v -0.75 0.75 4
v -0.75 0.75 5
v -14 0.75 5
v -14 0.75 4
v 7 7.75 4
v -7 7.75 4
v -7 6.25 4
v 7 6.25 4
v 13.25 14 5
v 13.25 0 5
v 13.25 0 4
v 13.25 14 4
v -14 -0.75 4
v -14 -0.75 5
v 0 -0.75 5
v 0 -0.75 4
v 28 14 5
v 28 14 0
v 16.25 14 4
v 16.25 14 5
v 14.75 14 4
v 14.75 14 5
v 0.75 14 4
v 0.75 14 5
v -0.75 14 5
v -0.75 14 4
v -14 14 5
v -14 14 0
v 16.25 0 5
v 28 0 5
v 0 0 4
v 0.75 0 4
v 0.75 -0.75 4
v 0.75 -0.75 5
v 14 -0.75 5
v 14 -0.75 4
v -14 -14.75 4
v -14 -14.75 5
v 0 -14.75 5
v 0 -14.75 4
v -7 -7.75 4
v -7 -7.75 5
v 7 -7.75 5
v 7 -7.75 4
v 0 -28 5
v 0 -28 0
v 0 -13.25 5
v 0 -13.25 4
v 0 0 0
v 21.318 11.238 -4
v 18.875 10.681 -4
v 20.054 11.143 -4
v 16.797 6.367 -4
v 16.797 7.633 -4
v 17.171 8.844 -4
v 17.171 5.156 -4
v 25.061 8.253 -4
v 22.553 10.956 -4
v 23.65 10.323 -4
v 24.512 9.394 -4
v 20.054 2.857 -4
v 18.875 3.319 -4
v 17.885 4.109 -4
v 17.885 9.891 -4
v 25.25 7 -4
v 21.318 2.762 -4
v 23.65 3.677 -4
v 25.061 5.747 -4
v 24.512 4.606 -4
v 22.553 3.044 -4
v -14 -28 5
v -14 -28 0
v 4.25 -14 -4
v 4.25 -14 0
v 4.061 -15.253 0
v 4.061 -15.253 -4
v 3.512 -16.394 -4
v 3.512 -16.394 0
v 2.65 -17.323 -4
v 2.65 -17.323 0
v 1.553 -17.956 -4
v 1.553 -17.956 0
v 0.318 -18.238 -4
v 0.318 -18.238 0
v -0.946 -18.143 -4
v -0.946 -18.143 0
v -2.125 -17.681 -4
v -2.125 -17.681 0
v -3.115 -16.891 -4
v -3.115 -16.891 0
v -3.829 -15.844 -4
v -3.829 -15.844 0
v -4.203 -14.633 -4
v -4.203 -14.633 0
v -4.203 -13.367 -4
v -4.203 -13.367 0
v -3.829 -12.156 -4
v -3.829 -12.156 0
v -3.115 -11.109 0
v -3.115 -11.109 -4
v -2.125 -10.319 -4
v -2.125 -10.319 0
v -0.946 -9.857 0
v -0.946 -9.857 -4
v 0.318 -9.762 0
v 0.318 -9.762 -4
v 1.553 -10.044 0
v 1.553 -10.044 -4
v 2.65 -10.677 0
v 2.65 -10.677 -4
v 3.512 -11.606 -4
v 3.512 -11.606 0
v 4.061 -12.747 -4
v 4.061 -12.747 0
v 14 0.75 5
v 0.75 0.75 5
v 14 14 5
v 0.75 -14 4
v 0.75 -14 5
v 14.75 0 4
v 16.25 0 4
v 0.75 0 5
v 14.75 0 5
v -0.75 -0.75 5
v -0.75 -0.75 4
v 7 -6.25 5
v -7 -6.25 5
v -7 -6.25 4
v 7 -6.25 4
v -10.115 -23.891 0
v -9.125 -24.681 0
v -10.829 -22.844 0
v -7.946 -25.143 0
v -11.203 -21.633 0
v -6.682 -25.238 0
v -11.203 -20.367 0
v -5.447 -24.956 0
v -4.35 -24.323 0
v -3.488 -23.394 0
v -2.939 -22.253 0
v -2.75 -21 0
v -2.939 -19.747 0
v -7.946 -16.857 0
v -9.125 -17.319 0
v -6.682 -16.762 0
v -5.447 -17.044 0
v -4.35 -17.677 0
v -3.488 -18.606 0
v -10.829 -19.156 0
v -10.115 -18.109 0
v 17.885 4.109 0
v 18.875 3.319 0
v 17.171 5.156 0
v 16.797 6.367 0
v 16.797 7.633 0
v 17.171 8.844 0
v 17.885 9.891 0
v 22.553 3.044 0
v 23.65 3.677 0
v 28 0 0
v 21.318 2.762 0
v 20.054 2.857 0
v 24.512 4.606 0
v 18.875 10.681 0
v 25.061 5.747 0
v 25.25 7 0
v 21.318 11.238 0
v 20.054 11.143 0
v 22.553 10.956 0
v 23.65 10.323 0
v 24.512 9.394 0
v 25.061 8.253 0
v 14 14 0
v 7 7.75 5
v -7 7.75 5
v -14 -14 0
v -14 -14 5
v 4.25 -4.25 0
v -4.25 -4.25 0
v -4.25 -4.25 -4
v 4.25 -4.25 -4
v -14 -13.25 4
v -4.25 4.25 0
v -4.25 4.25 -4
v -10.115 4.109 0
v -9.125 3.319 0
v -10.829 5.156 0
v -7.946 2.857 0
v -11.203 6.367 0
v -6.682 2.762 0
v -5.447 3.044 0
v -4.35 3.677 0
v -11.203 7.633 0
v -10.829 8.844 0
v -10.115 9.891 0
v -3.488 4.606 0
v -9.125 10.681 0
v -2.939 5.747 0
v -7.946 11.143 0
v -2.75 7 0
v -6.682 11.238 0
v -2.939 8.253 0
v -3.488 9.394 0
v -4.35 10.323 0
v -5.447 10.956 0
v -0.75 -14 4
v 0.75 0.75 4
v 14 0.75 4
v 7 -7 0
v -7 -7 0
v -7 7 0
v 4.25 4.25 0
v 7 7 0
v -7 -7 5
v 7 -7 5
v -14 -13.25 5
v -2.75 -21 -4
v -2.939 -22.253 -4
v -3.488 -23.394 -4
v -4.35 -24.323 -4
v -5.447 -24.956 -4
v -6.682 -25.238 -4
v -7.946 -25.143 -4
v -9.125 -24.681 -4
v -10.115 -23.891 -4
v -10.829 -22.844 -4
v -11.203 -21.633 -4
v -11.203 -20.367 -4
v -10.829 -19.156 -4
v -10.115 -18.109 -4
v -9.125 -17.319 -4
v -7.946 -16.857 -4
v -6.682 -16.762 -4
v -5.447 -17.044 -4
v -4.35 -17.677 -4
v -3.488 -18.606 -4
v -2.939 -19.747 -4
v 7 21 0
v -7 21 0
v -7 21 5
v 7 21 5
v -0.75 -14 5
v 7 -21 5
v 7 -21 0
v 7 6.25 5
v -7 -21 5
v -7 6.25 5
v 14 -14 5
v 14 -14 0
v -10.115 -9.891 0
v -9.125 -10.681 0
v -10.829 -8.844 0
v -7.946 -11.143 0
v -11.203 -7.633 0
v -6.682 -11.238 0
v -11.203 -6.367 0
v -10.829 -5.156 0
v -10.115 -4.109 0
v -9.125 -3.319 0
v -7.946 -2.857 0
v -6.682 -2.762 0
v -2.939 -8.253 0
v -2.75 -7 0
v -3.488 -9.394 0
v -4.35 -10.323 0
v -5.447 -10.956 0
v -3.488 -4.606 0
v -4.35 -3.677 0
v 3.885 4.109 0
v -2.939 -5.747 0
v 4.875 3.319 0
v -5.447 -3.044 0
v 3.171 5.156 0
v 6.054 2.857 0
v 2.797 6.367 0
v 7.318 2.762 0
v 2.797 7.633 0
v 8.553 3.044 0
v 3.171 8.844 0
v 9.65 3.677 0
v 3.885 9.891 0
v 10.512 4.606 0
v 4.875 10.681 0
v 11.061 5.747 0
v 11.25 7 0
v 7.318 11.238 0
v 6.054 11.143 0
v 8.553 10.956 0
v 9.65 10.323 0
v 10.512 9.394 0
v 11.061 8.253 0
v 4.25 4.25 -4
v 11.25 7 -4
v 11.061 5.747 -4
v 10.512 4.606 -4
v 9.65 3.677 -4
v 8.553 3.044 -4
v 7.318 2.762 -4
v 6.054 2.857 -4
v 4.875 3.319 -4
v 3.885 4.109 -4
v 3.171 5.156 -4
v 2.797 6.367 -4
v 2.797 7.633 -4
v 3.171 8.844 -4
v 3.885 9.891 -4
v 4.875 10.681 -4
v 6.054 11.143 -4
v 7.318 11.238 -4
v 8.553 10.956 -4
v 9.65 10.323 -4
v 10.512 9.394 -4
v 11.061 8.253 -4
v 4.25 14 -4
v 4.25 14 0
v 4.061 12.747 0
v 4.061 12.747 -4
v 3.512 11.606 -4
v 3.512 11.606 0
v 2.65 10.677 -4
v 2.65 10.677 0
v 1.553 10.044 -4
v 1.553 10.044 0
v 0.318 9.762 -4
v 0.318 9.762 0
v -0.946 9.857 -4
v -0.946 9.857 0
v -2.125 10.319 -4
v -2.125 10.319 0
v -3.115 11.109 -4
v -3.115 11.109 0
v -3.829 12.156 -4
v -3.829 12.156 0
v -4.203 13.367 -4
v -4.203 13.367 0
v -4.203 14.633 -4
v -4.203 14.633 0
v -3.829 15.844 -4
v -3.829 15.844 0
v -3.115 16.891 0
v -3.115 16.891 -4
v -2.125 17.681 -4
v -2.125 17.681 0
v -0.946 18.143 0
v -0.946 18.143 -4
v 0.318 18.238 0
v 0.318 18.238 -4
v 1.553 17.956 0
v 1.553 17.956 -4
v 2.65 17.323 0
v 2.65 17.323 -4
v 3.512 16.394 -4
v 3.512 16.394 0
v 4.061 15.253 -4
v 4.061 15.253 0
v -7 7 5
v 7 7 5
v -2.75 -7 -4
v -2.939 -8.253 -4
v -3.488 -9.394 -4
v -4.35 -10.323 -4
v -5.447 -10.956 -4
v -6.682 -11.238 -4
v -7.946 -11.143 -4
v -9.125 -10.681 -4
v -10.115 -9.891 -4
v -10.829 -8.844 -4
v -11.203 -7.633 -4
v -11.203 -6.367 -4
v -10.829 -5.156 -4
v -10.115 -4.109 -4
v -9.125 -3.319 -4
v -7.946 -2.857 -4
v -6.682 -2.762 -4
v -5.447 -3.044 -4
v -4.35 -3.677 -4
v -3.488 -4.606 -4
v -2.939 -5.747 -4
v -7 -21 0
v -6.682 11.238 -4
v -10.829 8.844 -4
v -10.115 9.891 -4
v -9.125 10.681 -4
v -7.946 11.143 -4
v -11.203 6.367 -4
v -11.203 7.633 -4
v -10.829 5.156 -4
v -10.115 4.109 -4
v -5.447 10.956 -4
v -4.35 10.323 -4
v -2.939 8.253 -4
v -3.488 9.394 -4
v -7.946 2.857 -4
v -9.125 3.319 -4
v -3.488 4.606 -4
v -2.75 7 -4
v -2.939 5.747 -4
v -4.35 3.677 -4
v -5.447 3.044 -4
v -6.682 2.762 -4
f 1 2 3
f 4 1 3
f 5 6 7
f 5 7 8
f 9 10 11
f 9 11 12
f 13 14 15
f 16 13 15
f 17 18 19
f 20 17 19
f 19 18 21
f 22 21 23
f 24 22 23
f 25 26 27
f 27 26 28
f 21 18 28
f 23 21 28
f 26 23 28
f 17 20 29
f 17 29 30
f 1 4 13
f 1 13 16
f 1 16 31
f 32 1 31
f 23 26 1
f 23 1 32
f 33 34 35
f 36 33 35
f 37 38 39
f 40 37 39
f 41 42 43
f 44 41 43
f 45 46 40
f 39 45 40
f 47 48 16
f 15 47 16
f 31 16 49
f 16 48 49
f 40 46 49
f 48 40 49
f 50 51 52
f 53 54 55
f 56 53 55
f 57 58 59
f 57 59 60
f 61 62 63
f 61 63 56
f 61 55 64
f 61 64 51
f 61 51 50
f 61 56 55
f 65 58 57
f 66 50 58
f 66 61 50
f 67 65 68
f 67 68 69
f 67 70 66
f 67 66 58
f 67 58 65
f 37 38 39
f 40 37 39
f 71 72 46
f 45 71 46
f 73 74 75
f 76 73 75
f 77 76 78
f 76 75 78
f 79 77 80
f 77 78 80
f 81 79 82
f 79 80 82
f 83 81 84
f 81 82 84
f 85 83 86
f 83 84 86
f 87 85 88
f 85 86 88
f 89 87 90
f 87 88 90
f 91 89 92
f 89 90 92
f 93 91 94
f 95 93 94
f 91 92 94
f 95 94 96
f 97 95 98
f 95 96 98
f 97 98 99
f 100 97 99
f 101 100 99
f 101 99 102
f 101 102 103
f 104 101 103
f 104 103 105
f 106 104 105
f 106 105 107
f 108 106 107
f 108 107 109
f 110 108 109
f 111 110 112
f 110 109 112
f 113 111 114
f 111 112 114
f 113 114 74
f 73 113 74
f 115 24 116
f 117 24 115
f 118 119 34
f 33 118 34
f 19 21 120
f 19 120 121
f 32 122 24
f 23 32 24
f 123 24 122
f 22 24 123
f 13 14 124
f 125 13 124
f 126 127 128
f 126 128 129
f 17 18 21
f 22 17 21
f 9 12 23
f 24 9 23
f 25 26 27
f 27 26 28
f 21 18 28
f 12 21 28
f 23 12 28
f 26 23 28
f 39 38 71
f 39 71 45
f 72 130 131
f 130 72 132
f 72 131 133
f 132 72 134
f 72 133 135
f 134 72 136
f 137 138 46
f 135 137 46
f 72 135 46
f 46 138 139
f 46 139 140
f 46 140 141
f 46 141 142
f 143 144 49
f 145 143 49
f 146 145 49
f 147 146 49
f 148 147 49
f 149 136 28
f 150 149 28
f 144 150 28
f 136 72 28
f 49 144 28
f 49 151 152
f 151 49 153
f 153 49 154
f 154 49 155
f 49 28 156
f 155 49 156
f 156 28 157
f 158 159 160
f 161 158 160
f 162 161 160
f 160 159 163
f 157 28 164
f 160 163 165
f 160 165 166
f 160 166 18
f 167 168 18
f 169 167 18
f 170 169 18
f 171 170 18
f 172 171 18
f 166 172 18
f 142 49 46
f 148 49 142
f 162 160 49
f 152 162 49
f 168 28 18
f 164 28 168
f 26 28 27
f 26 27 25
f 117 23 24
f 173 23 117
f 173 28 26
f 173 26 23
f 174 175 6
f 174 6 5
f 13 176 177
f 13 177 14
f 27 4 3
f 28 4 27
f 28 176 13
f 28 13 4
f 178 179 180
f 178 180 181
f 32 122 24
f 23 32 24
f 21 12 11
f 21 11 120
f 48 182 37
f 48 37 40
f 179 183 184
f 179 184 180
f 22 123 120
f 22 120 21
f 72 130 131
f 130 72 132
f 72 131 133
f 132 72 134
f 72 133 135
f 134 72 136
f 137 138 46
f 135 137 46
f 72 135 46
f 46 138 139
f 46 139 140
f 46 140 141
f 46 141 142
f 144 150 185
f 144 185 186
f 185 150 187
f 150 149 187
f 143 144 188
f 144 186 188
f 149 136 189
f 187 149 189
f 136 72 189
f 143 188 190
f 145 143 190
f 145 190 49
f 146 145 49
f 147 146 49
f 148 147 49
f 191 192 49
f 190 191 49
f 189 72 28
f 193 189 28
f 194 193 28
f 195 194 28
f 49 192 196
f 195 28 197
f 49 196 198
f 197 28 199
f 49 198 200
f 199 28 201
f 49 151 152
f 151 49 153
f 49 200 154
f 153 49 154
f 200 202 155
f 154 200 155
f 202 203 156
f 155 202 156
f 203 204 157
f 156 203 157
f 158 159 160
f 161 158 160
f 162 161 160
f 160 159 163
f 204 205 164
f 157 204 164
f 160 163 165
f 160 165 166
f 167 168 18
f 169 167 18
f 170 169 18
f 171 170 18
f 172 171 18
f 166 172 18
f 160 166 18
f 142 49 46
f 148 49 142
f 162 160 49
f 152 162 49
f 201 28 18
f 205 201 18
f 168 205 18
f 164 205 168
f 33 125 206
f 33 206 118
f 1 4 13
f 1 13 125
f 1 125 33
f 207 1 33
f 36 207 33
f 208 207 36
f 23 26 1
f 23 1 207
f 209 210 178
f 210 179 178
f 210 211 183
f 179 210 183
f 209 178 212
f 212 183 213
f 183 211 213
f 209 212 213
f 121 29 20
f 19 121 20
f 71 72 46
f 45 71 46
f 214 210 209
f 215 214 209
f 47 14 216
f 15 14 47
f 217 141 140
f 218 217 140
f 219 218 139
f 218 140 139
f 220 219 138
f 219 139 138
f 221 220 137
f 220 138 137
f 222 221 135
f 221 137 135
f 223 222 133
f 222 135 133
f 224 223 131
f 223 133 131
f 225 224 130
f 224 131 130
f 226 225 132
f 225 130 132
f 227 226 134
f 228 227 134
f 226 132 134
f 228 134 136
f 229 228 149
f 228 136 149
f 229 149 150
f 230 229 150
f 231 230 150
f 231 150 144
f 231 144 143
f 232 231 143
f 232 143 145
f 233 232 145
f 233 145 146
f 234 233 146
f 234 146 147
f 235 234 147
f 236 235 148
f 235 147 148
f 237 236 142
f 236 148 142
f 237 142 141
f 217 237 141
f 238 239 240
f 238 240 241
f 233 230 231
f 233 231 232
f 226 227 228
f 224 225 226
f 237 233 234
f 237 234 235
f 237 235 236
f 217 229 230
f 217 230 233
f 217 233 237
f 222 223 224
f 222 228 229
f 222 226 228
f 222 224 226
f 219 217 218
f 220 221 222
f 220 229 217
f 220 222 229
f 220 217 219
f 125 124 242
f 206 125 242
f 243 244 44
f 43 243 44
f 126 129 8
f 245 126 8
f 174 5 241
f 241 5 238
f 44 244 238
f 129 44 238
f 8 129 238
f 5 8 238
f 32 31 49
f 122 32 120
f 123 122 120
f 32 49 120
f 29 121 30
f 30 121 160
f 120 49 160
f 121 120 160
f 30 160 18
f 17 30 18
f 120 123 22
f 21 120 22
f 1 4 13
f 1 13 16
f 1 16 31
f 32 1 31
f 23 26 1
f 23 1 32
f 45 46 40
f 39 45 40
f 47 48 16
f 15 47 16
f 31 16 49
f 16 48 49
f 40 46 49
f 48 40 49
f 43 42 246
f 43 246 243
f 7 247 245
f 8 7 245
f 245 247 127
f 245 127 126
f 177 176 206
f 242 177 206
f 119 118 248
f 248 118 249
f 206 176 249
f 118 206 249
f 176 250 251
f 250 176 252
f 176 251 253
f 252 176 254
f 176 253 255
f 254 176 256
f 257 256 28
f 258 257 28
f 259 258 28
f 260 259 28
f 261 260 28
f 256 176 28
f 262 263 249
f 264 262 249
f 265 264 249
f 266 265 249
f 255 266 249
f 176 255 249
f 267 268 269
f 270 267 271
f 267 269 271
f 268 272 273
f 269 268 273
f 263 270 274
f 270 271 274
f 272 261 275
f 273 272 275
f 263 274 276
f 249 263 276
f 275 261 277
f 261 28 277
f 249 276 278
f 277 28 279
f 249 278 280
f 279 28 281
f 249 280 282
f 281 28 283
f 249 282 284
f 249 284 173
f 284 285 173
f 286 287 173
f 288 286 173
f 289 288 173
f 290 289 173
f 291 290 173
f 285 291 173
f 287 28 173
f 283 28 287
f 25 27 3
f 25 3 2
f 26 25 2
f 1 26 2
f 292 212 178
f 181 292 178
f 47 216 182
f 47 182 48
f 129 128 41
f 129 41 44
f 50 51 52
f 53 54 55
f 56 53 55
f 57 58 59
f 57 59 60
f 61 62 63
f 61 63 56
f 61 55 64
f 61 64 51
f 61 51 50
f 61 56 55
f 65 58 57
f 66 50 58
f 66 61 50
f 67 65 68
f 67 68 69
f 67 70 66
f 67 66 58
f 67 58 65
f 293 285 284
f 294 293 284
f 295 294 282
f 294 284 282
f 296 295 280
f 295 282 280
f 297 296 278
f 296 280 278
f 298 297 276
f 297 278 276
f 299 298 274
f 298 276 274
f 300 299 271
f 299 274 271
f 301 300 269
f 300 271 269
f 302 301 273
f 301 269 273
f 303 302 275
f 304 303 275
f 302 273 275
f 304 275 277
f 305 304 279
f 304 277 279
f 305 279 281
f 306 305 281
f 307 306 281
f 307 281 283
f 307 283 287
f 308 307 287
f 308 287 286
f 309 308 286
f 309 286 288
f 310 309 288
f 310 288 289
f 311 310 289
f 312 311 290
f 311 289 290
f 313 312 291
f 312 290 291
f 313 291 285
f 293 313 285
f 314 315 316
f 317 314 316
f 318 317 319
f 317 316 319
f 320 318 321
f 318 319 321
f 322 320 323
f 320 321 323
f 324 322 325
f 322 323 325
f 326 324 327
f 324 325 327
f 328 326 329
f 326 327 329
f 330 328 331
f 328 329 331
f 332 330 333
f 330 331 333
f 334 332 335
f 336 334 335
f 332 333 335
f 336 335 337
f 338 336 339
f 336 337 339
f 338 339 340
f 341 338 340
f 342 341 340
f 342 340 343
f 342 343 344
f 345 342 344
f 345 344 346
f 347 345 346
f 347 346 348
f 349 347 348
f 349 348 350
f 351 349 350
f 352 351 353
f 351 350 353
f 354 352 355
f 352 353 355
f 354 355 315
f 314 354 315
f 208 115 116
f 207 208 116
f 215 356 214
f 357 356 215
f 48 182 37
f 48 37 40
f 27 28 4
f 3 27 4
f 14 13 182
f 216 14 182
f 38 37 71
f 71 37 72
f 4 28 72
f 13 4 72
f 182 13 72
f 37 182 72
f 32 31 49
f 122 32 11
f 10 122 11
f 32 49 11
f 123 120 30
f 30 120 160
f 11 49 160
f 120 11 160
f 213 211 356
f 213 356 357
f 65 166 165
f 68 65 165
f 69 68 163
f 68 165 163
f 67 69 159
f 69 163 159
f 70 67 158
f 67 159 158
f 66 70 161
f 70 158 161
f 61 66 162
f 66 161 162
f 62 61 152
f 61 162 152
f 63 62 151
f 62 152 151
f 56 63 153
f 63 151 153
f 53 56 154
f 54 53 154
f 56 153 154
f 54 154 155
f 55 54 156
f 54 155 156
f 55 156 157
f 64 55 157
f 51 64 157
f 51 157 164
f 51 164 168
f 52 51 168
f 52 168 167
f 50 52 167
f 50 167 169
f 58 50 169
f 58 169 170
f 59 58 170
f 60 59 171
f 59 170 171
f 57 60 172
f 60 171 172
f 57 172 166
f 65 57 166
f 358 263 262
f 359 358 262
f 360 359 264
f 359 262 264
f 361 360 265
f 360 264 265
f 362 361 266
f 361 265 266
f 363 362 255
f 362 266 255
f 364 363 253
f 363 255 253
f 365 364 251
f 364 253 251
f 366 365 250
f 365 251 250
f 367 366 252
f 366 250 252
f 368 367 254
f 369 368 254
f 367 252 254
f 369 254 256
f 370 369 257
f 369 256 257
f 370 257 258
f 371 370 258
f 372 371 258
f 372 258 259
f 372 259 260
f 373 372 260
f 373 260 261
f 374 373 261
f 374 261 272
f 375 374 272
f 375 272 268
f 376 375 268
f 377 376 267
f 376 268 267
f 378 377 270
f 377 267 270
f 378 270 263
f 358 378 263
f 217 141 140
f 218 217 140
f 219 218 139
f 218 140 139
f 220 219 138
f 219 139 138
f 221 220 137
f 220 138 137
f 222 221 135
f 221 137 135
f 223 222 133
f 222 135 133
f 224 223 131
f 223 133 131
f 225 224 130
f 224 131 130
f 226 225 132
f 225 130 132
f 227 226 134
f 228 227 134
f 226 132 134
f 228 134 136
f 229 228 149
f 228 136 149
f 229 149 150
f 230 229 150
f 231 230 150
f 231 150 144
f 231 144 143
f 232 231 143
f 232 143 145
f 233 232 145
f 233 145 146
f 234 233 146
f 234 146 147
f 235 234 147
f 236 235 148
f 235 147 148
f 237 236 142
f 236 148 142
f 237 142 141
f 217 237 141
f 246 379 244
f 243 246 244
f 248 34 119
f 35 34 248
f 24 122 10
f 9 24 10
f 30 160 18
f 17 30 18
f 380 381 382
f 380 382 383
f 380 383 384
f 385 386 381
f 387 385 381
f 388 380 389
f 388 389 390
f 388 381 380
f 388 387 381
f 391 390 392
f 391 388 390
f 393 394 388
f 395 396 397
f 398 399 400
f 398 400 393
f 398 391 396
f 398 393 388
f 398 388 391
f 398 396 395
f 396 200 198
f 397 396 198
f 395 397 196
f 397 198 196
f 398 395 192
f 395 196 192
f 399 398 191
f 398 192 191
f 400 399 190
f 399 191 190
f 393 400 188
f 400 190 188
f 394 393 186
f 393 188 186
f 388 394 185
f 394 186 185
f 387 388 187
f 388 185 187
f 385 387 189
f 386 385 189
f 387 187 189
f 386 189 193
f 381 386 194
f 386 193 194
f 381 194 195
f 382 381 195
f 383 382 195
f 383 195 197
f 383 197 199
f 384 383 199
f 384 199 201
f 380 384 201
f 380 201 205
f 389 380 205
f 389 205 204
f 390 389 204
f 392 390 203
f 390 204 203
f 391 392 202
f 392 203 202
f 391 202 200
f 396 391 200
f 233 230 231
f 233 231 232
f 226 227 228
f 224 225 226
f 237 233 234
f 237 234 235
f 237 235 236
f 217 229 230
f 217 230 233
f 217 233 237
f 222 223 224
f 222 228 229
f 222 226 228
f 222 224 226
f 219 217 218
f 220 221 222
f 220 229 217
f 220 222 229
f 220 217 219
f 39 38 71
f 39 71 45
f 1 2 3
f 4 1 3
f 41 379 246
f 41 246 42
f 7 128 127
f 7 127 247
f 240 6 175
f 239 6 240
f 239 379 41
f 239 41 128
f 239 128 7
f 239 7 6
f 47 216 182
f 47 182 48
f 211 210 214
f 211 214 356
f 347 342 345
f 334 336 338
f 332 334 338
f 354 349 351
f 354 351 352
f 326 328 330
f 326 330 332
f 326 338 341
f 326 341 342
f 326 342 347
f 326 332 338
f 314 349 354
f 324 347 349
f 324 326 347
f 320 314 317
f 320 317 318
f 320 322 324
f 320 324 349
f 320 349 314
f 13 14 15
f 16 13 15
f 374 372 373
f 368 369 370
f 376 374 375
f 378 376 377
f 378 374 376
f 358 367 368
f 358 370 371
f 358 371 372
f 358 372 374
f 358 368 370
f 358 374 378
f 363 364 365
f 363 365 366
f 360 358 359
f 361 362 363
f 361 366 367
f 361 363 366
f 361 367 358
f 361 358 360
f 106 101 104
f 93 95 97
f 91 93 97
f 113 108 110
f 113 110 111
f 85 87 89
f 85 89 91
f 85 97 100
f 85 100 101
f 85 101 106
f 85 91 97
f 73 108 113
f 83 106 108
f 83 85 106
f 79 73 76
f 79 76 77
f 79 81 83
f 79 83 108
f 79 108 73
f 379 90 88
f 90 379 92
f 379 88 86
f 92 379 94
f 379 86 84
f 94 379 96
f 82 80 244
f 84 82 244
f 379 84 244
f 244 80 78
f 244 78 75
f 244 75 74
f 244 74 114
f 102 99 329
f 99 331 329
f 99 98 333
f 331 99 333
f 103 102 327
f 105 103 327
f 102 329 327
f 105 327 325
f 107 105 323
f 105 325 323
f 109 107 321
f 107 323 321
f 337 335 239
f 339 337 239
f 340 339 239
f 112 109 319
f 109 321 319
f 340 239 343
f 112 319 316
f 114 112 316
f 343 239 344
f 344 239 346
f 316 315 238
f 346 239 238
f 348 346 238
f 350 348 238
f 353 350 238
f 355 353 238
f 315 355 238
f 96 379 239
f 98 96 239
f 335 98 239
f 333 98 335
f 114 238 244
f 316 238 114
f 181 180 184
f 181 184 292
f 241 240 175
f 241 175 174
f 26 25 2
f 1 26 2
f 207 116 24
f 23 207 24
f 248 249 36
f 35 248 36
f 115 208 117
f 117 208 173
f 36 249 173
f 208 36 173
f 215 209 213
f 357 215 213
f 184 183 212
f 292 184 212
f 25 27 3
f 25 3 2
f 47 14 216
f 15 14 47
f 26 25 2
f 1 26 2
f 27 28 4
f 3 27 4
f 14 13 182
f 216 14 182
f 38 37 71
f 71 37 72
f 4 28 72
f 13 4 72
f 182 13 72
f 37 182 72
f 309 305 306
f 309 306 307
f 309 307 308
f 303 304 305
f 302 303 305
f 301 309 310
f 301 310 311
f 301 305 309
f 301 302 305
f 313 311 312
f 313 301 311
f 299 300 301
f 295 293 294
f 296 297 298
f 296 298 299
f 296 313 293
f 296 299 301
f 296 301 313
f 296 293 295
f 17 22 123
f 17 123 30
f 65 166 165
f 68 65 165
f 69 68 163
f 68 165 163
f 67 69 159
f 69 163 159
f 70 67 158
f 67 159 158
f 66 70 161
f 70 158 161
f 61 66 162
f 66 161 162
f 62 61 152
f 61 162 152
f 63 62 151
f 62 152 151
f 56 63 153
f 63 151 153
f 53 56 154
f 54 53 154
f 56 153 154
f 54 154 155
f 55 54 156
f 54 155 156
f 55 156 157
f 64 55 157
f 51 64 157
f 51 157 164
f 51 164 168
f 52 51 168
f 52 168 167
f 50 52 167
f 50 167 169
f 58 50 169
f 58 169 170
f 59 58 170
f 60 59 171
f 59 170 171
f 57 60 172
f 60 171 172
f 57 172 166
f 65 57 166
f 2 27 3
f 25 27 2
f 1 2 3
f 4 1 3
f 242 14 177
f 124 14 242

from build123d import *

# Parameters (mm, degrees)
SKETCH_W        = 14
SKETCH_H        = 14
PAD_DEPTH       = 5
SKETCH002_W     = 8.5
SKETCH002_H     = 8.5
PAD001_DEPTH    = 4
SKETCH003_W     = 28
SKETCH003_H     = 28
PAD002_DEPTH    = 5
SKETCH004_R     = 4.25
PAD003_DEPTH    = 4
POCKET_DEPTH    = 1
SKETCH006_W     = 14
SKETCH006_H     = 42
PAD004_DEPTH    = 5
SKETCH007_R     = 4.25
PAD005_DEPTH    = 4
SKETCH008_W     = 14
SKETCH008_H     = 1.5
POCKET001_DEPTH = 1
PAD006_DEPTH    = 5
SKETCH010_R     = 4.25
PAD007_DEPTH    = 4
SKETCH013_W     = 1.5
SKETCH013_H     = 14
SKETCH013_W_2   = 14
SKETCH013_H_2   = 1.5
POCKET002_DEPTH = 1
PAD008_DEPTH    = 5
SKETCH012_R     = 4.25
PAD009_DEPTH    = 4
SKETCH014_W     = 1.5
SKETCH014_H     = 14
SKETCH014_W_2   = 14
SKETCH014_H_2   = 1.5
POCKET003_DEPTH = 1


with BuildPart() as body:
    # Sketch → Pad (new body)
    with BuildSketch(Plane.XY):
        Rectangle(SKETCH_W, SKETCH_H)
    extrude(amount=PAD_DEPTH)

    # Sketch002 (on Face5 of Pad) → Pad001 (join)
    with BuildSketch(Plane(origin=(0, 0, 0), x_dir=(1, 0, 0), z_dir=(0, 0, -1))):
        Rectangle(SKETCH002_W, SKETCH002_H)
    extrude(amount=PAD001_DEPTH)


with BuildPart() as body001:
    # Sketch003 → Pad002 (new body)
    with BuildSketch(Plane.XY):
        Rectangle(SKETCH003_W, SKETCH003_H)
    extrude(amount=PAD002_DEPTH)

    # Sketch004 (on Face5 of Pad002) → Pad003 (join)
    with BuildSketch(Plane(origin=(0, 0, 0), x_dir=(1, 0, 0), z_dir=(0, 0, -1))):
        with Locations((-7, 7)):
            Circle(SKETCH004_R)
        with Locations((7, -7)):
            Circle(SKETCH004_R)
    extrude(amount=PAD003_DEPTH)

    # Sketch005 (on Face5 of Pad003) → Pocket (cut)
    with BuildSketch(Plane.XY.offset(5)):
        Polygon((-0.75, 14), (-0.75, 0.75), (-14, 0.75), (-14, -0.75), (-0.75, -0.75), (-0.75, -14), (0.75, -14), (0.75, -0.75), (14, -0.75), (14, 0.75), (0.75, 0.75), (0.75, 14), align=None)
    extrude(amount=-POCKET_DEPTH, mode=Mode.SUBTRACT)


with BuildPart() as body002:
    # Sketch006 → Pad004 (new body)
    with BuildSketch(Plane.XY):
        Rectangle(SKETCH006_W, SKETCH006_H)
    extrude(amount=PAD004_DEPTH)

    # Sketch007 (on Face5 of Pad004) → Pad005 (join)
    with BuildSketch(Plane(origin=(0, 0, 0), x_dir=(1, 0, 0), z_dir=(0, 0, -1))):
        with Locations((0, 14)):
            Circle(SKETCH007_R)
        with Locations((0, -14)):
            Circle(SKETCH007_R)
    extrude(amount=PAD005_DEPTH)

    # Sketch008 (on Face5 of Pad005) → Pocket001 (cut)
    with BuildSketch(Plane.XY.offset(5)):
        with Locations((0, 7)):
            Rectangle(SKETCH008_W, SKETCH008_H)
        with Locations((0, -7)):
            Rectangle(SKETCH008_W, SKETCH008_H)
    extrude(amount=-POCKET001_DEPTH, mode=Mode.SUBTRACT)


with BuildPart() as body003:
    # Sketch009 → Pad006 (new body)
    with BuildSketch(Plane.XY):
        Polygon((-14, 14), (-14, -28), (0, -28), (0, 0), (28, 0), (28, 14), align=None)
    extrude(amount=PAD006_DEPTH)

    # Sketch010 (on Face7 of Pad006) → Pad007 (join)
    with BuildSketch(Plane(origin=(0, 0, 0), x_dir=(1, 0, 0), z_dir=(0, 0, -1))):
        with Locations((21, -7)):
            Circle(SKETCH010_R)
        with Locations((-7, 21)):
            Circle(SKETCH010_R)
        with Locations((-7, -7)):
            Circle(SKETCH010_R)
    extrude(amount=PAD007_DEPTH)

    # Sketch013 (on Face5 of Pad007) → Pocket002 (cut)
    with BuildSketch(Plane.XY.offset(5)):
        with Locations((14, 7)):
            Rectangle(SKETCH013_W, SKETCH013_H)
        with Locations((-7, -14)):
            Rectangle(SKETCH013_W_2, SKETCH013_H_2)
        Polygon((0.75, 14), (-0.75, 14), (-0.75, 0.75), (-14, 0.75), (-14, -0.75), (0.75, -0.75), align=None)
    extrude(amount=-POCKET002_DEPTH, mode=Mode.SUBTRACT)


with BuildPart() as body004:
    # Sketch011 → Pad008 (new body)
    with BuildSketch(Plane.XY):
        Polygon((-14, 14), (-14, -28), (0, -28), (0, 0), (28, 0), (28, 14), align=None)
    extrude(amount=PAD008_DEPTH)

    # Sketch012 (on Face7 of Pad008) → Pad009 (join)
    with BuildSketch(Plane(origin=(0, 0, 0), x_dir=(1, 0, 0), z_dir=(0, 0, -1))):
        with Locations((21, -7)):
            Circle(SKETCH012_R)
        with Locations((-7, 21)):
            Circle(SKETCH012_R)
    extrude(amount=PAD009_DEPTH)

    # Sketch014 (on Face5 of Pad009) → Pocket003 (cut)
    with BuildSketch(Plane.XY.offset(5)):
        Polygon((0.75, 14), (-0.75, 14), (-0.75, 0.75), (-14, 0.75), (-14, -0.75), (0.75, -0.75), align=None)
        with Locations((15.5, 7)):
            Rectangle(SKETCH014_W, SKETCH014_H)
        with Locations((-7, -14)):
            Rectangle(SKETCH014_W_2, SKETCH014_H_2)
    extrude(amount=-POCKET003_DEPTH, mode=Mode.SUBTRACT)


solid = Compound([body.part, body001.part, body002.part, body003.part, body004.part])
